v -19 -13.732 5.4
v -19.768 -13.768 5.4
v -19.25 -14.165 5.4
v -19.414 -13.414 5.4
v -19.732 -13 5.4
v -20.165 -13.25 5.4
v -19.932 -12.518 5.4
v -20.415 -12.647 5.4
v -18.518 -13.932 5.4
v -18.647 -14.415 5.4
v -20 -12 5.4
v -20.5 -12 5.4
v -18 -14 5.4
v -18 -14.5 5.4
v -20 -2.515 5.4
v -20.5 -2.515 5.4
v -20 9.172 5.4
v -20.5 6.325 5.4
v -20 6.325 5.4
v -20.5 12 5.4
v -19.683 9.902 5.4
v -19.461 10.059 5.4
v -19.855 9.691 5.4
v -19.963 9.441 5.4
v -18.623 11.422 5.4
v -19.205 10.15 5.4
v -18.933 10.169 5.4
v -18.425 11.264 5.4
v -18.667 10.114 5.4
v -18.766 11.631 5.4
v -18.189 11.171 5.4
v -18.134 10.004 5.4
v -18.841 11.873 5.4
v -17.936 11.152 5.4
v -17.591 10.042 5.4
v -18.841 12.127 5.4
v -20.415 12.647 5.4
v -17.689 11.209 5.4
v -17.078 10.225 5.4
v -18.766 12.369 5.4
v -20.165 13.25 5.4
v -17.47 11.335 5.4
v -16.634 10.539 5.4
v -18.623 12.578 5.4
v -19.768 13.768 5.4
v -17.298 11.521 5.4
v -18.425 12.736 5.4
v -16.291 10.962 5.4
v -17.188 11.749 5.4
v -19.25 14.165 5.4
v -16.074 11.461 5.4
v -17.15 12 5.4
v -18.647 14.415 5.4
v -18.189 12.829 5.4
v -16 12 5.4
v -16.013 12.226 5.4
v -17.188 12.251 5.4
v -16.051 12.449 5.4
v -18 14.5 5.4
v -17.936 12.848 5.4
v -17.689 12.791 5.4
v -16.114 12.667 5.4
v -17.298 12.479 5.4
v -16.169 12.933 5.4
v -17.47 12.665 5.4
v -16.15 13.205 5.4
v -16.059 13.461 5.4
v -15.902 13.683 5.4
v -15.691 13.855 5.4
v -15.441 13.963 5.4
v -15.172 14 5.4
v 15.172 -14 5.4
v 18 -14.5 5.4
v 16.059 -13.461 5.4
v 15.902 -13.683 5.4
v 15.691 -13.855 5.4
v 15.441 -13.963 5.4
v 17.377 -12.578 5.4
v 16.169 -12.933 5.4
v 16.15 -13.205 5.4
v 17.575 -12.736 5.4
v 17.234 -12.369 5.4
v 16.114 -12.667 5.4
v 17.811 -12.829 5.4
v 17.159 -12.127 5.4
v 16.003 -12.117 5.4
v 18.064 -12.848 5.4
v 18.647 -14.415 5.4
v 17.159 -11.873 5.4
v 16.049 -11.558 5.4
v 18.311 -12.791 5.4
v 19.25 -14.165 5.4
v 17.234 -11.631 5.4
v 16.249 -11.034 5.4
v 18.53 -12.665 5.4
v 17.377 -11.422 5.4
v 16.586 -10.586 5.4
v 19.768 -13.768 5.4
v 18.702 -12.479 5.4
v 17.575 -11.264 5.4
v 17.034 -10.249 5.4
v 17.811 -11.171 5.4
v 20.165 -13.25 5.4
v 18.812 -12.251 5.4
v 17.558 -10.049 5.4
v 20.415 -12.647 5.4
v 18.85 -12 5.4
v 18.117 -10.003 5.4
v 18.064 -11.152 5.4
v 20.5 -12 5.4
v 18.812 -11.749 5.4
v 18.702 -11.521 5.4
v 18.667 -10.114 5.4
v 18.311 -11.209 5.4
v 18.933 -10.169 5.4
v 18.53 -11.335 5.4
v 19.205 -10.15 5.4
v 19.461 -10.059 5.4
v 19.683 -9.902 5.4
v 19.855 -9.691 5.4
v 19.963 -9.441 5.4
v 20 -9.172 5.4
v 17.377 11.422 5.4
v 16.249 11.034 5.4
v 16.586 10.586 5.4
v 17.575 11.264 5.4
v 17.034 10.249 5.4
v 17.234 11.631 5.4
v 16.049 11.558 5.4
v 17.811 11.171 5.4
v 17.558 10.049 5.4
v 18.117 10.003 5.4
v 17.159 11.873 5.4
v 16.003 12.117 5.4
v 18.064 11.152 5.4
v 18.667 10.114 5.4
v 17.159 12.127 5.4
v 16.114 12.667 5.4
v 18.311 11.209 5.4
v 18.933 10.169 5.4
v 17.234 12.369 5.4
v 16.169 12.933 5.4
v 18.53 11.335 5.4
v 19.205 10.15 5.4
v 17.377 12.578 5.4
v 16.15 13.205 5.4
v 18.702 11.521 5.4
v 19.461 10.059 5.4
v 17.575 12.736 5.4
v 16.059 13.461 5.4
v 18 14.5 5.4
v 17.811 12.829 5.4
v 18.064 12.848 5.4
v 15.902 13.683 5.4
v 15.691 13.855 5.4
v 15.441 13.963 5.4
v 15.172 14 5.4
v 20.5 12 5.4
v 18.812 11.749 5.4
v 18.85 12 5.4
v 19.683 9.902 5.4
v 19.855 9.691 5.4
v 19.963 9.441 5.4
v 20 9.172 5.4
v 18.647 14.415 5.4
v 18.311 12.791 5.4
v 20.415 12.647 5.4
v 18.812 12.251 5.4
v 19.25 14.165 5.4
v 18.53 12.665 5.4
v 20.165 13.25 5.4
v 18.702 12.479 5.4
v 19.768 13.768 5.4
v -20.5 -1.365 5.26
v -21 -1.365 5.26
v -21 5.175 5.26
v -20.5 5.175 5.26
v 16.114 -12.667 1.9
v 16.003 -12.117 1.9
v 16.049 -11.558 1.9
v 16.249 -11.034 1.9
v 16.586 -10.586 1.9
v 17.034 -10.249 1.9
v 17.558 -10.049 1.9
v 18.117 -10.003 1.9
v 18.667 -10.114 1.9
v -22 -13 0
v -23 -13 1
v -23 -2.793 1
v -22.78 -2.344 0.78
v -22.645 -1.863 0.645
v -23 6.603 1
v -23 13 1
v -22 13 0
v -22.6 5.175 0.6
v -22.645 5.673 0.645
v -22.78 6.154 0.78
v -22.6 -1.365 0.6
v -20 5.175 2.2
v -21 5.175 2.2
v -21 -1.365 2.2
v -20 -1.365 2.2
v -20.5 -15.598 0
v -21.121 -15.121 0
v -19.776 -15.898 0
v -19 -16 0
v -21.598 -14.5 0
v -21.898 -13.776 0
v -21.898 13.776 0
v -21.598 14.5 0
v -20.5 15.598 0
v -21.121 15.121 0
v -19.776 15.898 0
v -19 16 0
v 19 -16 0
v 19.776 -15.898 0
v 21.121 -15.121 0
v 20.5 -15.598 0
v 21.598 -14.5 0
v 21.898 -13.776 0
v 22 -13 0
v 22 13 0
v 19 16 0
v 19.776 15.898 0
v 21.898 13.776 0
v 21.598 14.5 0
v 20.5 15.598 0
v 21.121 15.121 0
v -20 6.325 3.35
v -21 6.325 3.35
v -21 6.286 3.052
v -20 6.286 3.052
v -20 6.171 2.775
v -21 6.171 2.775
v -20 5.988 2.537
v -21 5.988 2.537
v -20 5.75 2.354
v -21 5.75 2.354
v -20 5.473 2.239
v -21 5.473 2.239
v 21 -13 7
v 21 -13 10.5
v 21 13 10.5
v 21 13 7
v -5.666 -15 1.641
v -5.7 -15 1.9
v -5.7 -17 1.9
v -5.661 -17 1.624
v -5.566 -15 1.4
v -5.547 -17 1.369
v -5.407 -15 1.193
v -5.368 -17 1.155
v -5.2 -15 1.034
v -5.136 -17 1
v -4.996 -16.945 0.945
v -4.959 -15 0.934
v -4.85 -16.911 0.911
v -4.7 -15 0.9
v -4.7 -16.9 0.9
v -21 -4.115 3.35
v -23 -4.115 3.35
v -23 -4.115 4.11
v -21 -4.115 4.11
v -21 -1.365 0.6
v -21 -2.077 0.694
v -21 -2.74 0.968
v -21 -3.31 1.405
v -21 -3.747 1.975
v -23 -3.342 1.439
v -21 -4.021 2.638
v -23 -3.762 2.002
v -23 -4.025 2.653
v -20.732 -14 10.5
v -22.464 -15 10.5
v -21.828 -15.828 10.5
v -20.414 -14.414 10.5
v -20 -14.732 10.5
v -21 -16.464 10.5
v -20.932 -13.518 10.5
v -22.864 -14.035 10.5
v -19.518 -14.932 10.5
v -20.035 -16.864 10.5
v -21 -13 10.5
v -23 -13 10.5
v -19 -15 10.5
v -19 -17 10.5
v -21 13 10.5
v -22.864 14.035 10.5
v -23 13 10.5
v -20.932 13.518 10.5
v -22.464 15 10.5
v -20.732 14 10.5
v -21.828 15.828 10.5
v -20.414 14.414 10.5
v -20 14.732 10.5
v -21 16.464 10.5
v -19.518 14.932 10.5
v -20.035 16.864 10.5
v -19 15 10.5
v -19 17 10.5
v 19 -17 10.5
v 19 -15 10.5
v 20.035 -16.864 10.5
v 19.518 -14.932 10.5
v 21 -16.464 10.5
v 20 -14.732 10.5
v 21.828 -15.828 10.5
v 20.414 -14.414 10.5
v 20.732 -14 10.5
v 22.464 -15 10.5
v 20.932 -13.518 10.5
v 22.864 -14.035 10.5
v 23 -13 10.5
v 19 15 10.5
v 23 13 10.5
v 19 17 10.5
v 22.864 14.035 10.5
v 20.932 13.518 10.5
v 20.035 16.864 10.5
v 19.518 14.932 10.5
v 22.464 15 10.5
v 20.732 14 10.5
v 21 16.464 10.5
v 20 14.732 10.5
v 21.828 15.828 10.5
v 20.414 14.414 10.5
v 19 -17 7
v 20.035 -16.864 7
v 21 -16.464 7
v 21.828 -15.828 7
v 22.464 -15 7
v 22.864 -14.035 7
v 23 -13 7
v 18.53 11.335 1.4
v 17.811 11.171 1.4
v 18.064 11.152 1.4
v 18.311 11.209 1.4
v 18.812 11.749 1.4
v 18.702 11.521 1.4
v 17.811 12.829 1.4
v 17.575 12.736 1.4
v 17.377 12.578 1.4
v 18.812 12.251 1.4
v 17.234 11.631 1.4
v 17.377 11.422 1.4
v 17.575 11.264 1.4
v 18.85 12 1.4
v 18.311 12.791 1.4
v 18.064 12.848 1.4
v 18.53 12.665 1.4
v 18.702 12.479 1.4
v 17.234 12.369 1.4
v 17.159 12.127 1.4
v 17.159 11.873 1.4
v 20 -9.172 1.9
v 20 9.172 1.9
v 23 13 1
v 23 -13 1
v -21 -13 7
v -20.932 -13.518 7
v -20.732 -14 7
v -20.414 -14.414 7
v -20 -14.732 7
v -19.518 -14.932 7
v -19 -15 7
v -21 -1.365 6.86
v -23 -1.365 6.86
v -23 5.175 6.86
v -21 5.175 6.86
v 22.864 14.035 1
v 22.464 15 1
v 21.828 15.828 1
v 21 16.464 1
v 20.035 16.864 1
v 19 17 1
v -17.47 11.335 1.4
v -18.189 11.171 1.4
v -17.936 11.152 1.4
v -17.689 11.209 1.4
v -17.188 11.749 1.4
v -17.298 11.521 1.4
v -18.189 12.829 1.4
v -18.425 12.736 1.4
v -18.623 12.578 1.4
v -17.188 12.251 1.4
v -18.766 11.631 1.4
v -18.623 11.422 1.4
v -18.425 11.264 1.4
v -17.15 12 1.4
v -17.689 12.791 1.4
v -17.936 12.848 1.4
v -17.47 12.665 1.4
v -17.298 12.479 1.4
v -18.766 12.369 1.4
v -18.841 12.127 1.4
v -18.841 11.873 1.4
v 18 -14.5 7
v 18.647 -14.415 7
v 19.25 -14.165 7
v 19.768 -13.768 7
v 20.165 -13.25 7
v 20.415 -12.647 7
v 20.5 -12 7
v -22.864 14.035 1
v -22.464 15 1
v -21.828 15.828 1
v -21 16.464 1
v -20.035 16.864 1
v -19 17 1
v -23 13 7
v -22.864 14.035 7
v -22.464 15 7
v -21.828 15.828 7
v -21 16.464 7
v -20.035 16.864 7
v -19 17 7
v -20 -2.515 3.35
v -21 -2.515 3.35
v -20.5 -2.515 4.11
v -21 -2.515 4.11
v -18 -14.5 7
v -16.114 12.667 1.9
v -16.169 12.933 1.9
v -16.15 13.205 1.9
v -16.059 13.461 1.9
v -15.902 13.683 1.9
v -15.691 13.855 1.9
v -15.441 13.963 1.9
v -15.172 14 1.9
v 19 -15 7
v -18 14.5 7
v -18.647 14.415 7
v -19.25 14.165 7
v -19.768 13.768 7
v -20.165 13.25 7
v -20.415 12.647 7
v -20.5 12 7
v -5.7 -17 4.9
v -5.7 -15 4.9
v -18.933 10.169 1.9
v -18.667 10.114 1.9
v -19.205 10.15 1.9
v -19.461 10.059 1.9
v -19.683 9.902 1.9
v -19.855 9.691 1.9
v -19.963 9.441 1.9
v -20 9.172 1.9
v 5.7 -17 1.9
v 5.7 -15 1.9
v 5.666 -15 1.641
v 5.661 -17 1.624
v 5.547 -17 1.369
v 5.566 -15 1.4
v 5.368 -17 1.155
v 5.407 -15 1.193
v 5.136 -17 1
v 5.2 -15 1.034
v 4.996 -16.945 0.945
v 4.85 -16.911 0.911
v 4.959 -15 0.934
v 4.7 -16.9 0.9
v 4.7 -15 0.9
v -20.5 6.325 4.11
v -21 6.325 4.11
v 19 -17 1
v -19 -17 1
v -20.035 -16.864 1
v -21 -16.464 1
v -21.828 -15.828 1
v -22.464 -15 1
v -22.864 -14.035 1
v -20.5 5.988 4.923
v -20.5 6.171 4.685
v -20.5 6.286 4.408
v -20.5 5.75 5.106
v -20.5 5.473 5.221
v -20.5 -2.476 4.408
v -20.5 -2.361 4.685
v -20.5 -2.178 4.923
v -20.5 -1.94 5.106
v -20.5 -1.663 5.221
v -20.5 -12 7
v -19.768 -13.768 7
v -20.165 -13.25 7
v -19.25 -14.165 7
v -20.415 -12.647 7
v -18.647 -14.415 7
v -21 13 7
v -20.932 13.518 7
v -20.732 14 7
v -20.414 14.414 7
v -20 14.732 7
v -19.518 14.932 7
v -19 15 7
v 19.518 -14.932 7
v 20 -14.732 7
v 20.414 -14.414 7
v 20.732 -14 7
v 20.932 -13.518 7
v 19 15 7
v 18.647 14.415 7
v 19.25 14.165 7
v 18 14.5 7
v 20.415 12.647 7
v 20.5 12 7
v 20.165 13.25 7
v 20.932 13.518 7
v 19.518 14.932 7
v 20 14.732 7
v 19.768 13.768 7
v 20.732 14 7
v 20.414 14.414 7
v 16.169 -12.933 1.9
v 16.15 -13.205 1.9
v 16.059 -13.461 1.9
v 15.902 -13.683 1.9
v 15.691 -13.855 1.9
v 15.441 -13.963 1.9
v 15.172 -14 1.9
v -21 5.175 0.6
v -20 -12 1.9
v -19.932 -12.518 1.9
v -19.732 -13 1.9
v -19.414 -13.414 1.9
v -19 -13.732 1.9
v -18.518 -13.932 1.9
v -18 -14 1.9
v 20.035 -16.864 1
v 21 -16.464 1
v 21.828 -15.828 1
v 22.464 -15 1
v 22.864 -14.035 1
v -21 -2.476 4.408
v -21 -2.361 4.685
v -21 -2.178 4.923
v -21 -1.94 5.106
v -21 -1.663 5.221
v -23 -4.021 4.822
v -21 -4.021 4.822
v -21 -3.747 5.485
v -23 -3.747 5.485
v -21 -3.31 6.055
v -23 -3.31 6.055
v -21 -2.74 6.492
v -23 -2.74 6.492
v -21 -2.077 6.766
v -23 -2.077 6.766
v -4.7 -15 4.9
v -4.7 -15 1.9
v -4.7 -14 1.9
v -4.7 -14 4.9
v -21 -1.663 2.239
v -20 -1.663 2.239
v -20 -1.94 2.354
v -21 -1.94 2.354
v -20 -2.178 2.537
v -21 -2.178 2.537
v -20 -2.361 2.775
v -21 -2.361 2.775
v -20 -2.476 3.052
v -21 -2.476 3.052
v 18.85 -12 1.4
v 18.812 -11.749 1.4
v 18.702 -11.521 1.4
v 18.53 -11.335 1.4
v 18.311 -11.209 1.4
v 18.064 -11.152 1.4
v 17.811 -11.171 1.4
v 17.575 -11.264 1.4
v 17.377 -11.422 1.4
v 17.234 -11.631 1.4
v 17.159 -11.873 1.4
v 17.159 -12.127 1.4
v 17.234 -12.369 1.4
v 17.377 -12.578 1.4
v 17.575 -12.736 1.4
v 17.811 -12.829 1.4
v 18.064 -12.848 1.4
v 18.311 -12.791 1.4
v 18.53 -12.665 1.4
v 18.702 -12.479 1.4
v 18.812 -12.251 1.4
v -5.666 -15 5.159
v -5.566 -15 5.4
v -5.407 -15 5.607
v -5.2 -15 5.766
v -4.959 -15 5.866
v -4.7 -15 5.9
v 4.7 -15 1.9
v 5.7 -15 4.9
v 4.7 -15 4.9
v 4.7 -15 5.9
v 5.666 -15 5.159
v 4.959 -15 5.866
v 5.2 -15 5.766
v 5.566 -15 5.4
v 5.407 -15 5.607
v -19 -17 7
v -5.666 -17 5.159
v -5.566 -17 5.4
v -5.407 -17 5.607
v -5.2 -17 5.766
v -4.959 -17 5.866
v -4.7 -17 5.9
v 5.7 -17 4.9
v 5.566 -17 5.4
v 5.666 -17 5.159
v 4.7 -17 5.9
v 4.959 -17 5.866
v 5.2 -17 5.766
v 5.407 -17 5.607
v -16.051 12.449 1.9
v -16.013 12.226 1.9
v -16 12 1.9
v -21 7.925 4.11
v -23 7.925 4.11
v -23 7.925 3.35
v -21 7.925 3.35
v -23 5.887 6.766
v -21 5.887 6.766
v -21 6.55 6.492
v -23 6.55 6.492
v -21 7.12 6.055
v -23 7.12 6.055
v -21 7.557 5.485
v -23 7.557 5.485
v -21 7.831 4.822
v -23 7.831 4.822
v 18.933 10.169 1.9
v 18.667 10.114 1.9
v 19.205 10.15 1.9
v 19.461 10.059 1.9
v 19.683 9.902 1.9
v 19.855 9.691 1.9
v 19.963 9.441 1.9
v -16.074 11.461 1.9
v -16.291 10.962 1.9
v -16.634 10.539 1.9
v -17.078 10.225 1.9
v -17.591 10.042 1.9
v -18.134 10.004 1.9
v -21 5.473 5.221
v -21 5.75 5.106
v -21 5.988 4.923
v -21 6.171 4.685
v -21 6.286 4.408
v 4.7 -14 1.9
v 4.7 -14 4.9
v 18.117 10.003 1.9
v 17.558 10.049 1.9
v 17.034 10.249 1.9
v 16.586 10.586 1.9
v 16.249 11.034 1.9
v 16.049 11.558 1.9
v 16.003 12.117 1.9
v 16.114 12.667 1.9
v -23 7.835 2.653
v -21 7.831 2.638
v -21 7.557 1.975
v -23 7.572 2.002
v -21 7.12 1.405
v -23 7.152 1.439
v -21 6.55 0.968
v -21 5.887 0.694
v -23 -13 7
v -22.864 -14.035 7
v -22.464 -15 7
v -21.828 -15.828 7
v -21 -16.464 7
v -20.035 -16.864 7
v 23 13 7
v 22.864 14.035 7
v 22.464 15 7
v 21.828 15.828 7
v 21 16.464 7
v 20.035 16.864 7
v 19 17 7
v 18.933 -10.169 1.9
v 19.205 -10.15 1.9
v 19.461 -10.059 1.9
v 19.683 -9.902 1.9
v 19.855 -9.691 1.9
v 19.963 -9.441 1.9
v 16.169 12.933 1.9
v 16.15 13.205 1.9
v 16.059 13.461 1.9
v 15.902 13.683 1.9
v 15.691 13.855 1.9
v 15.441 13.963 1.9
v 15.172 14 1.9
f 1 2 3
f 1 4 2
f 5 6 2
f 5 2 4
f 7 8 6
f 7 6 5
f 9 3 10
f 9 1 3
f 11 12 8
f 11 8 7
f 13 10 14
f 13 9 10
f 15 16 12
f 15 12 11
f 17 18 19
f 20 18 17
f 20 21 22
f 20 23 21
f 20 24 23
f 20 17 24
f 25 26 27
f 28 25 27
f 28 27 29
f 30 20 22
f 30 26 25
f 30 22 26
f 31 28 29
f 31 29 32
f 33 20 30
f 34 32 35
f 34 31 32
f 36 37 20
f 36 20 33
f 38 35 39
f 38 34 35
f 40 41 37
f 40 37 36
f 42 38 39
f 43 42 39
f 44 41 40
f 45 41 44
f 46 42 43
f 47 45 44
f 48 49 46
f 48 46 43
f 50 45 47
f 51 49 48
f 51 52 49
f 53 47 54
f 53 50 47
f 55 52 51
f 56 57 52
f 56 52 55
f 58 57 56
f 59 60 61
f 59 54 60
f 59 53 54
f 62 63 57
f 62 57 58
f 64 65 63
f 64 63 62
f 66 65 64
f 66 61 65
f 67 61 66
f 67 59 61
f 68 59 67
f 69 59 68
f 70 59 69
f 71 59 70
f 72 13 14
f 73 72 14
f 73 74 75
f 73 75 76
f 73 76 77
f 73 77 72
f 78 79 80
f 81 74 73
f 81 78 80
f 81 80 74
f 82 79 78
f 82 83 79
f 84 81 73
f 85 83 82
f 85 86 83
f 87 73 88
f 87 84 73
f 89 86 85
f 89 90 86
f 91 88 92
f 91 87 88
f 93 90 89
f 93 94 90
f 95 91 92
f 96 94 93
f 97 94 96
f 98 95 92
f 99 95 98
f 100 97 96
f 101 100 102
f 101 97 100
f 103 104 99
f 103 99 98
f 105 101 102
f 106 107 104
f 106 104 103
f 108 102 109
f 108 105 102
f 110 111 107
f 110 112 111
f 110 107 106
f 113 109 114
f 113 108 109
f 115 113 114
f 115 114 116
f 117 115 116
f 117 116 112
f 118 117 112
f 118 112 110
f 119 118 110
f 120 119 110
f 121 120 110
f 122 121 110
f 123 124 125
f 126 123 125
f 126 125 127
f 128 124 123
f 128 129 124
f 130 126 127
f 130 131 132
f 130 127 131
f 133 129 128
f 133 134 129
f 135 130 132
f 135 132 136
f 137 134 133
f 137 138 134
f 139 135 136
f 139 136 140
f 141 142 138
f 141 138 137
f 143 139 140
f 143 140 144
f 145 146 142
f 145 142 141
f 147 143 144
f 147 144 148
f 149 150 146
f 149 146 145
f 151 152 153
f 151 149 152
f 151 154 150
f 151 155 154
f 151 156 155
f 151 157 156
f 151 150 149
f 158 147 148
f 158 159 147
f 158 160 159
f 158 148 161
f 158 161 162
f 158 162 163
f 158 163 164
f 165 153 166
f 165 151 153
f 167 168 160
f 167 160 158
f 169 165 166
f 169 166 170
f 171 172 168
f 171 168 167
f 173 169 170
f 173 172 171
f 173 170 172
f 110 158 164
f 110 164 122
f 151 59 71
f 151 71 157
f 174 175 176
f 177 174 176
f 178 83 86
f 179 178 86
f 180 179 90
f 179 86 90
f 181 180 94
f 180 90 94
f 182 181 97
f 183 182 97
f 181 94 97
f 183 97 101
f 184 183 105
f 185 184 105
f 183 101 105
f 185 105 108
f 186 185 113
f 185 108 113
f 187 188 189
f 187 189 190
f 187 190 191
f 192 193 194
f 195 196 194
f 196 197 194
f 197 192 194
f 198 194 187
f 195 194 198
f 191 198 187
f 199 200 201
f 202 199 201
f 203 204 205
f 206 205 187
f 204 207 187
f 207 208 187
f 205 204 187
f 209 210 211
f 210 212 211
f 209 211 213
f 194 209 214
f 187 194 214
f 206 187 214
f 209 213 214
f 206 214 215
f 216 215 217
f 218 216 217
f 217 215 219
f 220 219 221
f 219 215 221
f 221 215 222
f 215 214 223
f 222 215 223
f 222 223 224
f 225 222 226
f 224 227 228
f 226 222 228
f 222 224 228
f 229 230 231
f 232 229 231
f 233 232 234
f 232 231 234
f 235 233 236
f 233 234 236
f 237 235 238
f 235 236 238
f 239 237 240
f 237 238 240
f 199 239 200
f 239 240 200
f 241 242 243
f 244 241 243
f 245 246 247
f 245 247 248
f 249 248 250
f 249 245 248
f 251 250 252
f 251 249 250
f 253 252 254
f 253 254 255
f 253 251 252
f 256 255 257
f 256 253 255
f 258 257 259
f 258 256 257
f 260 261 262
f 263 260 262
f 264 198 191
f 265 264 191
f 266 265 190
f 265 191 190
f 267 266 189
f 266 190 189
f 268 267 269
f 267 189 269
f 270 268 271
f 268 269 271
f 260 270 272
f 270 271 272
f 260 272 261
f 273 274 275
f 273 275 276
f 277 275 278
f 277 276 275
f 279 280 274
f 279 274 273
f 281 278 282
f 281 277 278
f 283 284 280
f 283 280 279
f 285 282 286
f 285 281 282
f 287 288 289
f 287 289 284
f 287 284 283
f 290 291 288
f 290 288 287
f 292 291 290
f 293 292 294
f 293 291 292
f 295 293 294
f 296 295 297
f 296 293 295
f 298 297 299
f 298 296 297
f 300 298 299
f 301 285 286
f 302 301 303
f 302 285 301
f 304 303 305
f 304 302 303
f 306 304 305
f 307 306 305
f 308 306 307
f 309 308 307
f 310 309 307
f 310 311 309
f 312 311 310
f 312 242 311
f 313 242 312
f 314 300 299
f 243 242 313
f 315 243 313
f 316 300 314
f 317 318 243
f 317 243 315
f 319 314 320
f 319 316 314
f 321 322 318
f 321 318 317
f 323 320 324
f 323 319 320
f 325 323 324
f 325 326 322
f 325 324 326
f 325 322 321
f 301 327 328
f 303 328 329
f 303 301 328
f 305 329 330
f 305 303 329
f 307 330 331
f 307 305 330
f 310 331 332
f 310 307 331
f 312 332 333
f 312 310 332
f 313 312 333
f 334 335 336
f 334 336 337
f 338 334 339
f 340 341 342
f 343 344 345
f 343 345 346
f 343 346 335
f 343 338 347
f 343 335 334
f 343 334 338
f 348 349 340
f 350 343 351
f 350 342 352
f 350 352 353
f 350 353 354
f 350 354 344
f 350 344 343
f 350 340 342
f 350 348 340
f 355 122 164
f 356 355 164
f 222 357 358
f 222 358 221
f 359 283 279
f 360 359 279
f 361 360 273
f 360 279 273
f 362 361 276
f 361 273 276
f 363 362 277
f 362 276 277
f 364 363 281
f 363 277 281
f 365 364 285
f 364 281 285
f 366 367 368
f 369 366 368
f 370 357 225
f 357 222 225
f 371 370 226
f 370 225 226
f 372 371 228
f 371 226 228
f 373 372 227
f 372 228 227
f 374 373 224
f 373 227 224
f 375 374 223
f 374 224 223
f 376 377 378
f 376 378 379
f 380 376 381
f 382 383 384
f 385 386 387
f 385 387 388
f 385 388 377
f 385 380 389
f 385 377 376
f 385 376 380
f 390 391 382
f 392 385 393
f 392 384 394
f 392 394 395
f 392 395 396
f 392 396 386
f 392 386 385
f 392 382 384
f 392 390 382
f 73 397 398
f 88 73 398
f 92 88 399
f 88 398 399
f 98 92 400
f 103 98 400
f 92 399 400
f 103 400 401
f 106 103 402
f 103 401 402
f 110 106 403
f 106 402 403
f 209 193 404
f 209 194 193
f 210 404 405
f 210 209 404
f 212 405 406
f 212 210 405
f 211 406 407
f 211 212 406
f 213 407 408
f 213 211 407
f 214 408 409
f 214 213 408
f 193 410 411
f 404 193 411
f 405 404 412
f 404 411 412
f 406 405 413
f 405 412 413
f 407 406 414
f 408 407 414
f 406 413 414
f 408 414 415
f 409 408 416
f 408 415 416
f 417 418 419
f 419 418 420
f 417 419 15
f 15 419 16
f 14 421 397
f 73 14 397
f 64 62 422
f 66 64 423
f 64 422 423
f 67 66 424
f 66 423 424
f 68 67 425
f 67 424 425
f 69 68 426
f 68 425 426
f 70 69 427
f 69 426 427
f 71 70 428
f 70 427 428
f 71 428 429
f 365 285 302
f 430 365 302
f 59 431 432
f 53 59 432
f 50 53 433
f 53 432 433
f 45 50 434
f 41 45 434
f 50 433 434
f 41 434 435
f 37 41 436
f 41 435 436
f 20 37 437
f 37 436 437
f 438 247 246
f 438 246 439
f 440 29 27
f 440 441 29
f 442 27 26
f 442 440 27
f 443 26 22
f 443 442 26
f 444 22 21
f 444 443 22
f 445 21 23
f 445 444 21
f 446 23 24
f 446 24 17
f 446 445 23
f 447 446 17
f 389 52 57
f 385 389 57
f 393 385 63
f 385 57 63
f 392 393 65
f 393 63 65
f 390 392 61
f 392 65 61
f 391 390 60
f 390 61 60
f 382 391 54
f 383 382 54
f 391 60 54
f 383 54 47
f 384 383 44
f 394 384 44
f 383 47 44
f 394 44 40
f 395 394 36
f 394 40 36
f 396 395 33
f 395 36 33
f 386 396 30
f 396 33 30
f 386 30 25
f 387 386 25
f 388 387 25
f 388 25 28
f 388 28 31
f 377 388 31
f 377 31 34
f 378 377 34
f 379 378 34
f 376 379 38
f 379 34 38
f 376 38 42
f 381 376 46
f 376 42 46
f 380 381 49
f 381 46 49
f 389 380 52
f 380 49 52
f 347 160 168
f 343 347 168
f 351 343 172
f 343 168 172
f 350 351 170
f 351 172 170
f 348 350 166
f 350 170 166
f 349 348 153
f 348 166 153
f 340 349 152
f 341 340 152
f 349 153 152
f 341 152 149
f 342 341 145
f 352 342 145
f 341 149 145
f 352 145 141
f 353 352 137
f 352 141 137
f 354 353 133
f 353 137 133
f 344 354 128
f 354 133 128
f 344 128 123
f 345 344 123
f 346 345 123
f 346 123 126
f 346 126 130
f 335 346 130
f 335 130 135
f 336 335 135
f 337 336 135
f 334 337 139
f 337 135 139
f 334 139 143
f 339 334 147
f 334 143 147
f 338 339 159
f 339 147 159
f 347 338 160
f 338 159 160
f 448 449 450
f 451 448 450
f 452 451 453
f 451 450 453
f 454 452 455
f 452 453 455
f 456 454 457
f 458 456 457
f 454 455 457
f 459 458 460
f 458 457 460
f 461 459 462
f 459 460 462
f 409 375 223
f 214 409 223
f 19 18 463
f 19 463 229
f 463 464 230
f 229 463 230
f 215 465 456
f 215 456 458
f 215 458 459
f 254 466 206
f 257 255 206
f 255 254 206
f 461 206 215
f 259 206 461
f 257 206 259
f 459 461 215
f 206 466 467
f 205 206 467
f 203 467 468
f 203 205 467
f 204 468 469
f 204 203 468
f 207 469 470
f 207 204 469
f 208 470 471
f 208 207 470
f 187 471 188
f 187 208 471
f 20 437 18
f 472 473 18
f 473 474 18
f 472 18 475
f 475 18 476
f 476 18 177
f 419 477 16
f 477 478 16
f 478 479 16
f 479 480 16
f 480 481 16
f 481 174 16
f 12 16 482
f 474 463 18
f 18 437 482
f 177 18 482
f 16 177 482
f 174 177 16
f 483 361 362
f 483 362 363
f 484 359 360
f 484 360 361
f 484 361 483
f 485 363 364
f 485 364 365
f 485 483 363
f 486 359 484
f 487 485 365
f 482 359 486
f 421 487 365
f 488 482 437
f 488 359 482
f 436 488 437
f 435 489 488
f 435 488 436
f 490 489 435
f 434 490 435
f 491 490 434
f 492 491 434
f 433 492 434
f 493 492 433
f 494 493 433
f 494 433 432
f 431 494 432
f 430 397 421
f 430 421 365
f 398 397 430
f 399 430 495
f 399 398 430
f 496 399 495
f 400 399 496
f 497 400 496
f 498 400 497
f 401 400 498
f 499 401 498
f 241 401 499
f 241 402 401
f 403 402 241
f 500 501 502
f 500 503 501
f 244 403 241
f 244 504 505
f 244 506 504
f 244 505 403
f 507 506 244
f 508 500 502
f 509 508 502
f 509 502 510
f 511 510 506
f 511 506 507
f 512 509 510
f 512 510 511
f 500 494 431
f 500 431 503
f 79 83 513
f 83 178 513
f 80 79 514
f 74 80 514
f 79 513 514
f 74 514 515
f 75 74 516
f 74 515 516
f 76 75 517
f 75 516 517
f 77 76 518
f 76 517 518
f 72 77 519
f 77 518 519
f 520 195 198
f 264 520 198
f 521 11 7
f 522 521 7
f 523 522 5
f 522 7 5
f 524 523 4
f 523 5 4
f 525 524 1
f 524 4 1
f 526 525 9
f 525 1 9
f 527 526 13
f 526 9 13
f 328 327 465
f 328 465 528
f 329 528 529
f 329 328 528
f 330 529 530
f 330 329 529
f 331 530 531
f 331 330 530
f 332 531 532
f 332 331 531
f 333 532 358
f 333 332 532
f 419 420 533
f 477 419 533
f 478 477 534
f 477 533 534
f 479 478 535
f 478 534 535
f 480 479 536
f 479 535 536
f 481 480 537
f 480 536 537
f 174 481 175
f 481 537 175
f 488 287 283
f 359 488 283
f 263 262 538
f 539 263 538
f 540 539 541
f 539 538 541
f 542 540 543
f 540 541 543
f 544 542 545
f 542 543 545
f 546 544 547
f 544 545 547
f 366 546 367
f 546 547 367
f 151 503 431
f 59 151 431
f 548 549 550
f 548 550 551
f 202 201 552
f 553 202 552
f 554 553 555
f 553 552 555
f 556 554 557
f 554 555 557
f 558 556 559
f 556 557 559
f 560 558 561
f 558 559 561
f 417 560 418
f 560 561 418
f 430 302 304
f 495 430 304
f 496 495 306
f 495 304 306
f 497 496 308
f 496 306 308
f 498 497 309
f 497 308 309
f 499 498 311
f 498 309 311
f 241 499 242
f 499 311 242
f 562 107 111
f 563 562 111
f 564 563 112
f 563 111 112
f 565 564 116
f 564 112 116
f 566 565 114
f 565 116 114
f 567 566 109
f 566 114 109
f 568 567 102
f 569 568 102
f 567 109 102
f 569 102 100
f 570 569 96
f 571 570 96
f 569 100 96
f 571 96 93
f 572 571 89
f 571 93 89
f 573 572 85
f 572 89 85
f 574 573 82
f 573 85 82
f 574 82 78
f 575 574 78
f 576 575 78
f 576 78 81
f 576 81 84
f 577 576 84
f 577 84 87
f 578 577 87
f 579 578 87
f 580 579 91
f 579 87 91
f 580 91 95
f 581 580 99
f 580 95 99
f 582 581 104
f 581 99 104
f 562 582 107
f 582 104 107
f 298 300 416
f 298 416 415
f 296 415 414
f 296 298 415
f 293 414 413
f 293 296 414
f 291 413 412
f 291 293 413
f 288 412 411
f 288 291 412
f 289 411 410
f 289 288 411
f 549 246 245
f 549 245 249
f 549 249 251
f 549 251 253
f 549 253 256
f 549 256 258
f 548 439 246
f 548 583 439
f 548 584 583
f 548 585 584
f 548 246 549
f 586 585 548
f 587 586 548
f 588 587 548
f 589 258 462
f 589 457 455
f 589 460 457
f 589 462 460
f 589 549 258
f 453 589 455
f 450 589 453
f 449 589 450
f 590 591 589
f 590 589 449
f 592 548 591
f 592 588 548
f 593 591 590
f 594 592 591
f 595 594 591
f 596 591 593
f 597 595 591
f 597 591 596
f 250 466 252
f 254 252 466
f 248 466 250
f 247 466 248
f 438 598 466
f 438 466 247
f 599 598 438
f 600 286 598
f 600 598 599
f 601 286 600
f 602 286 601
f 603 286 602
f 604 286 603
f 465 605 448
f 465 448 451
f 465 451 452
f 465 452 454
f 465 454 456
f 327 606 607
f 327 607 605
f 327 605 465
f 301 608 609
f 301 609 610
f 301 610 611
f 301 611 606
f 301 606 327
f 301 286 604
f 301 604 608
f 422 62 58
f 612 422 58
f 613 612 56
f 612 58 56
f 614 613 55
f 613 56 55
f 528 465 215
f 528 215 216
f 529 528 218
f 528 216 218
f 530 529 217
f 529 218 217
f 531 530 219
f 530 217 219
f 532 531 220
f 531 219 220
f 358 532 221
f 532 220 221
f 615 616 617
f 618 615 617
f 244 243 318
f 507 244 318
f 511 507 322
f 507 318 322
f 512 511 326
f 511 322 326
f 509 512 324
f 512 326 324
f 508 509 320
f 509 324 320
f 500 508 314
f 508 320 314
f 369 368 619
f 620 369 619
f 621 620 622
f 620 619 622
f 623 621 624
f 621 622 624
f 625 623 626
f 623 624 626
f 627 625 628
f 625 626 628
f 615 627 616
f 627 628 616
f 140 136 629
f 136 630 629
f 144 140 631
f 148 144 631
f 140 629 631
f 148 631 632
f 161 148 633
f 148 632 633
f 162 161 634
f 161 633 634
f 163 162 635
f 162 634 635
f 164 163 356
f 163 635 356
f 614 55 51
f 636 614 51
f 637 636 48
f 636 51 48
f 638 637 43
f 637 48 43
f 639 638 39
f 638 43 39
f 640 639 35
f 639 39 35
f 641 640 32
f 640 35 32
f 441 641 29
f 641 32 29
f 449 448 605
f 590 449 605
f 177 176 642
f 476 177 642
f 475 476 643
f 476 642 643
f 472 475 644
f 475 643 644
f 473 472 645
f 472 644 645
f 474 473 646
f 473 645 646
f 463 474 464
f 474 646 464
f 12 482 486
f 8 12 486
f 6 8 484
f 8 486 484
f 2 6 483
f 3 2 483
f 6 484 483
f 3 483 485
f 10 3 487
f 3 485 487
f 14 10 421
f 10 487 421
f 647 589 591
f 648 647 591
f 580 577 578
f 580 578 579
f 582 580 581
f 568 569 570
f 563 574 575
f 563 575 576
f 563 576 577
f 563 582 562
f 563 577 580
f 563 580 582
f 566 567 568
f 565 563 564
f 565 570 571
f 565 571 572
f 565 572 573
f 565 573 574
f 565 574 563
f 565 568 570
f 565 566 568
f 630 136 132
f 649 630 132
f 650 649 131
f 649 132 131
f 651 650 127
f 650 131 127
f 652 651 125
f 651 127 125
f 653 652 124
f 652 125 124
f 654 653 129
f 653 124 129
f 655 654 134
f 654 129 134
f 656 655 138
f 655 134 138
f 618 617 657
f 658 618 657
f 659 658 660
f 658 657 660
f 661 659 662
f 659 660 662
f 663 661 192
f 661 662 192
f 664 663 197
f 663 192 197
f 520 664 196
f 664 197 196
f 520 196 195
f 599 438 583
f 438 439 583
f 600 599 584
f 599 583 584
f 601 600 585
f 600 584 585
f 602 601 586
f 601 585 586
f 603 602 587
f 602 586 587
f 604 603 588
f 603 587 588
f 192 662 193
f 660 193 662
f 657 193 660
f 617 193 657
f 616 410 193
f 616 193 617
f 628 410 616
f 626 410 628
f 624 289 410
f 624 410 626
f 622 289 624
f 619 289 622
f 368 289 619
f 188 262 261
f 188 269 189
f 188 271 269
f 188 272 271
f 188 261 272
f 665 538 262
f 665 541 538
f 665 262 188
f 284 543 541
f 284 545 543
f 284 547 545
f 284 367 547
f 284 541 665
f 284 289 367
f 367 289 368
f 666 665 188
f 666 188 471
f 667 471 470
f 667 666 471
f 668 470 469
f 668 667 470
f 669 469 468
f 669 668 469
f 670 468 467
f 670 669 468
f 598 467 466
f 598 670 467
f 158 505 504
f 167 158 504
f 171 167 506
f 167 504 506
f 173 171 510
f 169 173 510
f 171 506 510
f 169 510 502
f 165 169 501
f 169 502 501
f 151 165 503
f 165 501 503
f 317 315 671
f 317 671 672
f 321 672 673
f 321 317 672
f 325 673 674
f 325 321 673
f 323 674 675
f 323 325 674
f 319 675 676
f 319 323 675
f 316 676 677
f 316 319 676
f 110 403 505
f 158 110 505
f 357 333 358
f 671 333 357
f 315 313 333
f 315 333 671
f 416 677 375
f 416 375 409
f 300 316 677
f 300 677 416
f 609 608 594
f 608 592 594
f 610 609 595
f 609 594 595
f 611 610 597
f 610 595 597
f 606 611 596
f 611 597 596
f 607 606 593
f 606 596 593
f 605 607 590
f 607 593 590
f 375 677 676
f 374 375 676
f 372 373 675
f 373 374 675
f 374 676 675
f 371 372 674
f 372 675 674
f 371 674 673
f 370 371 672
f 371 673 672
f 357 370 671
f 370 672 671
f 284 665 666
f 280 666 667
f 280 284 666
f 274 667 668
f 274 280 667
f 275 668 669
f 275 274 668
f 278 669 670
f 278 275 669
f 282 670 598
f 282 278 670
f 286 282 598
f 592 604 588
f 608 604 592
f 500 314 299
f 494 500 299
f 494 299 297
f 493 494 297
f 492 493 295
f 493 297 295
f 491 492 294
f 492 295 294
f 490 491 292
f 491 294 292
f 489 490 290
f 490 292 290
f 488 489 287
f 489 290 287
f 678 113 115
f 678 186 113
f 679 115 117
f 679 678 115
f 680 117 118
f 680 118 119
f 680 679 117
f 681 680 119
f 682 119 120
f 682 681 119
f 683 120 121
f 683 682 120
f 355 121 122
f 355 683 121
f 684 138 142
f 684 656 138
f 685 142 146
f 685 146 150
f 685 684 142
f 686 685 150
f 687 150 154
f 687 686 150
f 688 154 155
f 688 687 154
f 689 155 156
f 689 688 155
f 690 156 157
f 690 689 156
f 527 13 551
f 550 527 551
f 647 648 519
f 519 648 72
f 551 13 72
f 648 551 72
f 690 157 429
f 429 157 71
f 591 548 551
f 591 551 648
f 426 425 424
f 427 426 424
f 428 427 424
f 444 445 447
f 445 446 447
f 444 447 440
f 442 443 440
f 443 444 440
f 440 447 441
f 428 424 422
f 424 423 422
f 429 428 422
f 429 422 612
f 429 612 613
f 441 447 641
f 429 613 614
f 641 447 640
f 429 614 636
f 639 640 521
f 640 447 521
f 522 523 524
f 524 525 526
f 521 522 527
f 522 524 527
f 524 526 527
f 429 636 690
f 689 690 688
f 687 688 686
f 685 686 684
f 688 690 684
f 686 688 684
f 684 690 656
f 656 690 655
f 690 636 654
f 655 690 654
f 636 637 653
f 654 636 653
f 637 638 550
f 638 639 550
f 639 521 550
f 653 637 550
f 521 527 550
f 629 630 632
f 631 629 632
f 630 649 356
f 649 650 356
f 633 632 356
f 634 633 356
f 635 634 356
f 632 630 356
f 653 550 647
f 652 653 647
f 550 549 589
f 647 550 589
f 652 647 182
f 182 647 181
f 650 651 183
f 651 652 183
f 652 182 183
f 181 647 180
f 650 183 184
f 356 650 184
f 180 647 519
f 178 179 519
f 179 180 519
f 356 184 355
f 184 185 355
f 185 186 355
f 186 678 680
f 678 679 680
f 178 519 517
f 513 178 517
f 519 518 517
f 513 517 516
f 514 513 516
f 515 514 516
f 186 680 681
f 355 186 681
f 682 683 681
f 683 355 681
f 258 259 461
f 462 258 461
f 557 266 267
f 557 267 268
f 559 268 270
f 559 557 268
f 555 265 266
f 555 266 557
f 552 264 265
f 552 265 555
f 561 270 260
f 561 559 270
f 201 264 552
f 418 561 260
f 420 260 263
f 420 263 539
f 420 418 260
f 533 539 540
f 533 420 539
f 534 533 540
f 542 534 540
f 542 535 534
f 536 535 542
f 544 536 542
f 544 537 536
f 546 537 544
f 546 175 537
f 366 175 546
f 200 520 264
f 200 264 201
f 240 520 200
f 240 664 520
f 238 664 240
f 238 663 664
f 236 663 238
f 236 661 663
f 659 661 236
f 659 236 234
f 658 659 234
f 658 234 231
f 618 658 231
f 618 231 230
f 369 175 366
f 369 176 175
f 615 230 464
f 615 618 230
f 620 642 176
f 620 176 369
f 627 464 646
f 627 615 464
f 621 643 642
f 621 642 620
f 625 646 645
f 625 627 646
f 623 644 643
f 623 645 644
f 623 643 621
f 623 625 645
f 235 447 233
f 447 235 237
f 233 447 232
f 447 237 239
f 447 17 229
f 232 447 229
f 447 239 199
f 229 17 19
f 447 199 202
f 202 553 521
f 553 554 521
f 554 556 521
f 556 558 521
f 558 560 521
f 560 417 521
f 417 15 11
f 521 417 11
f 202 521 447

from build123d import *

# Parameters (mm, degrees)
SKETCH_1_W           = 46
SKETCH_1_H           = 34
EXTRUDE_1_DEPTH      = 7
CUT_EXTRUDE_1_DEPTH  = 1.6
CUT_EXTRUDE_2_DEPTH  = 3.5
FILLET_1_R           = 1
FILLET_2_R           = 4
SKETCH_5_R           = 0.85
CUT_EXTRUDE_3_DEPTH  = 4
CUT_EXTRUDE_4_REACH  = 51.538
CUT_EXTRUDE_5_DEPTH  = 2
SKETCH_7_W           = 9.4
SKETCH_7_H           = 3
CUT_EXTRUDE_6_DEPTH  = 3
SKETCH_8_W           = 11.4
SKETCH_8_H           = 5
SKETCH_8_W_2         = 9.4
SKETCH_8_H_2         = 3
CUT_EXTRUDE_7_DEPTH  = 2
FILLET_3_R           = 1
EXTRUDE_START        = 3.5
EXTRUDE_2_DEPTH      = 3.5
CHAMFER_1_SIZE       = 1
CUT_EXTRUDE_9_DEPTH  = 1.6
CUT_EXTRUDE_10_REACH = 31.106
SKETCH_11_W          = 0.5
SKETCH_11_H          = 8.840000414
CUT_EXTRUDE_11_DEPTH = 2


with BuildPart() as part:
    # 草图1 → 凸台-拉伸1 (new body)
    with BuildSketch(Plane.XY):
        Rectangle(SKETCH_1_W, SKETCH_1_H)
    extrude(amount=EXTRUDE_1_DEPTH)

    # 草图3 → 切除-拉伸1 (cut)
    with BuildSketch(Plane.XY.offset(7)):
        with BuildLine():
            Line((-18, -14), (18, -14))
            ThreePointArc((18, -14), (19.414213562, -13.414213562), (20, -12))
            Line((20, -12), (20, 12))
            ThreePointArc((20, 12), (19.414213562, 13.414213562), (18, 14))
            Line((18, 14), (-18, 14))
            ThreePointArc((-18, 14), (-19.414213562, 13.414213562), (-20, 12))
            Line((-20, 12), (-20, -12))
            ThreePointArc((-20, -12), (-19.414213562, -13.414213562), (-18, -14))
        make_face()
    extrude(amount=-CUT_EXTRUDE_1_DEPTH, mode=Mode.SUBTRACT)

    # 草图4 → 切除-拉伸2 (cut)
    with BuildSketch(Plane.XY.offset(5.4)):
        with BuildLine():
            ThreePointArc((20, 12), (16.585786438, 10.585786438), (18, 14))
            Line((18, 14), (-18, 14))
            ThreePointArc((-18, 14), (-16.585786438, 13.414213562), (-16, 12))
            ThreePointArc((-16, 12), (-18, 10), (-20, 12))
            Line((-20, 12), (-20, -12))
            ThreePointArc((-20, -12), (-19.414213562, -13.414213562), (-18, -14))
            Line((-18, -14), (18, -14))
            ThreePointArc((18, -14), (16.585786438, -10.585786438), (20, -12))
            Line((20, -12), (20, 12))
        make_face()
    extrude(amount=-CUT_EXTRUDE_2_DEPTH, mode=Mode.SUBTRACT)

    # 圆角1
    fillet_1_edges = [part.edges().sort_by_distance(p)[0] for p in [
        (18, 14, 3.65),
        (20, 12, 3.65),
        (20, -12, 3.65),
        (18, -14, 3.65),
        (-20, 12, 3.65),
        (-18, 14, 3.65),
    ]]
    fillet(fillet_1_edges, radius=FILLET_1_R)

    # 圆角2
    fillet_2_edges = [part.edges().sort_by_distance(p)[0] for p in [
        (23, -17, 3.5),
        (-23, -17, 3.5),
        (-23, 17, 3.5),
        (23, 17, 3.5),
    ]]
    fillet(fillet_2_edges, radius=FILLET_2_R)

    # 草图5 → 切除-拉伸3 (cut)
    with BuildSketch(Plane.XY.offset(5.4)):
        with Locations((-18, 12)):
            Circle(SKETCH_5_R)
        with Locations((18, 12)):
            Circle(SKETCH_5_R)
        with Locations((18, -12)):
            Circle(SKETCH_5_R)
    extrude(amount=-CUT_EXTRUDE_3_DEPTH, mode=Mode.SUBTRACT)

    # 草图6 → 切除-拉伸4 (cut, up to next)
    with BuildSketch(Plane.ZY.offset(23), mode=Mode.PRIVATE) as cut_extrude_4_sk1:
        with BuildLine():
            Line((4.109999831, 6.325004017), (3.349999795, 6.325004017))
            ThreePointArc((3.349999795, 6.325004017), (2.536826958, 5.9881768), (2.199999741, 5.175003963))
            Line((2.199999741, 5.175003963), (2.199999741, -1.364996343))
            ThreePointArc((2.199999741, -1.364996343), (2.536826958, -2.17816918), (3.349999795, -2.514996397))
            Line((3.349999795, -2.514996397), (4.109999831, -2.514996397))
            ThreePointArc((4.109999831, -2.514996397), (4.923172667, -2.17816918), (5.259999885, -1.364996343))
            Line((5.259999885, -1.364996343), (5.259999885, 5.175003963))
            ThreePointArc((5.259999885, 5.175003963), (4.923172667, 5.9881768), (4.109999831, 6.325004017))
        make_face()
    cut_extrude_4_tool1 = extrude(cut_extrude_4_sk1.sketch, amount=-CUT_EXTRUDE_4_REACH, mode=Mode.PRIVATE) & part.part
    add(cut_extrude_4_tool1.solids().sort_by_distance((-23, 1.905004, 3.73))[0], mode=Mode.SUBTRACT)

    # 草图6<3> → 切除-拉伸5 (cut)
    with BuildSketch(Plane.ZY.offset(23)):
        with BuildLine():
            Line((3.349999795, -4.014996397), (4.109999831, -4.014996397))
            ThreePointArc((4.109999831, -4.014996397), (5.983832839, -3.238829352), (6.759999885, -1.364996343))
            Line((6.759999885, -1.364996343), (6.759999885, 5.175003963))
            ThreePointArc((6.759999885, 5.175003963), (5.983832839, 7.048836972), (4.109999831, 7.825004017))
            Line((4.109999831, 7.825004017), (3.349999795, 7.825004017))
            ThreePointArc((3.349999795, 7.825004017), (1.476166787, 7.048836972), (0.699999741, 5.175003963))
            Line((0.699999741, 5.175003963), (0.699999741, -1.364996343))
            ThreePointArc((0.699999741, -1.364996343), (1.476166787, -3.238829352), (3.349999795, -4.014996397))
        make_face()
        with BuildLine():
            Line((3.349999795, -2.514996397), (4.109999831, -2.514996397))
            ThreePointArc((4.109999831, -2.514996397), (4.923172667, -2.17816918), (5.259999885, -1.364996343))
            Line((5.259999885, -1.364996343), (5.259999885, 5.175003963))
            ThreePointArc((5.259999885, 5.175003963), (4.923172667, 5.9881768), (4.109999831, 6.325004017))
            Line((4.109999831, 6.325004017), (3.349999795, 6.325004017))
            ThreePointArc((3.349999795, 6.325004017), (2.536826958, 5.9881768), (2.199999741, 5.175003963))
            Line((2.199999741, 5.175003963), (2.199999741, -1.364996343))
            ThreePointArc((2.199999741, -1.364996343), (2.536826958, -2.17816918), (3.349999795, -2.514996397))
        make_face(mode=Mode.SUBTRACT)
    extrude(amount=-CUT_EXTRUDE_5_DEPTH, mode=Mode.SUBTRACT)

    # 草图7 → 切除-拉伸6 (cut)
    with BuildSketch(Plane.XZ.offset(17)):
        with Locations((0, 3.4)):
            Rectangle(SKETCH_7_W, SKETCH_7_H)
    extrude(amount=-CUT_EXTRUDE_6_DEPTH, mode=Mode.SUBTRACT)

    # 草图8 → 切除-拉伸7 (cut)
    with BuildSketch(Plane.XZ.offset(17)):
        with Locations((0, 3.4)):
            Rectangle(SKETCH_8_W, SKETCH_8_H)
        with Locations((0, 3.4)):
            Rectangle(SKETCH_8_W_2, SKETCH_8_H_2, mode=Mode.SUBTRACT)
    extrude(amount=-CUT_EXTRUDE_7_DEPTH, mode=Mode.SUBTRACT)

    # 圆角3
    fillet_3_edges = [part.edges().sort_by_distance(p)[0] for p in [
        (5.7, -16, 0.9),
        (-5.7, -16, 0.9),
        (-5.7, -16, 5.9),
        (5.7, -16, 5.9),
    ]]
    fillet(fillet_3_edges, radius=FILLET_3_R)

    # 草图9 → 凸台-拉伸2 (add)
    with BuildSketch(Plane.XY.offset(7).offset(EXTRUDE_START)):
        with BuildLine():
            Line((-19, -17), (19, -17))
            ThreePointArc((19, -17), (21.828427125, -15.828427125), (23, -13))
            Line((23, -13), (23, 13))
            ThreePointArc((23, 13), (21.828427125, 15.828427125), (19, 17))
            Line((19, 17), (-19, 17))
            ThreePointArc((-19, 17), (-21.828427125, 15.828427125), (-23, 13))
            Line((-23, 13), (-23, -13))
            ThreePointArc((-23, -13), (-21.828427125, -15.828427125), (-19, -17))
        make_face()
        with BuildLine():
            Line((-19, -15), (19, -15))
            ThreePointArc((19, -15), (20.414213562, -14.414213562), (21, -13))
            Line((21, -13), (21, 13))
            ThreePointArc((21, 13), (20.414213562, 14.414213562), (19, 15))
            Line((19, 15), (-19, 15))
            ThreePointArc((-19, 15), (-20.414213562, 14.414213562), (-21, 13))
            Line((-21, 13), (-21, -13))
            ThreePointArc((-21, -13), (-20.414213562, -14.414213562), (-19, -15))
        make_face(mode=Mode.SUBTRACT)
    extrude(amount=-EXTRUDE_2_DEPTH)

    # 倒角1
    # the kernel refuses this chamfer: 1 mm, written as the material it takes off along each edge
    with BuildSketch(Plane(origin=(19, 13, 0), x_dir=(1, 0, 0), z_dir=(0, -1, 0))) as chamfer_1_piece_1:
        Polygon((4, CHAMFER_1_SIZE), (4 - CHAMFER_1_SIZE, 0), (4, 0), align=None)
    revolve(axis=Axis((19, 13, 0), (0, 0, 1)), revolution_arc=90, mode=Mode.SUBTRACT)
    with BuildSketch(Plane(origin=(19, 17, 0), x_dir=(0, 0.02749587661058563, 0.9996219169112968), z_dir=(-1, 0, 0)), Plane(origin=(-19, -17, 0), x_dir=(0, -0.02749587661058563, 0.9996219169112968), z_dir=(1, 0, 0))) as chamfer_1_piece_2:
        Polygon((CHAMFER_1_SIZE * 0.999621916911, -CHAMFER_1_SIZE * 0.0274958766106), (-CHAMFER_1_SIZE * 0.0274958766106, -CHAMFER_1_SIZE * 0.999621916911), (0, 0), align=None)
    extrude(amount=38, mode=Mode.SUBTRACT)
    with BuildSketch(Plane(origin=(-19, 13, 0), x_dir=(-1, 0, 0), z_dir=(0, -1, 0))) as chamfer_1_piece_3:
        Polygon((4, -CHAMFER_1_SIZE), (4 - CHAMFER_1_SIZE, 0), (4, 0), align=None)
    revolve(axis=Axis((-19, 13, 0), (0, 0, -1)), revolution_arc=90, mode=Mode.SUBTRACT)
    with BuildSketch(Plane(origin=(-23, 13, 0), x_dir=(-0.02749587661058563, 0, 0.9996219169112968), z_dir=(0, -1, 0)), Plane(origin=(23, -13, 0), x_dir=(0.02749587661058563, 0, 0.9996219169112968), z_dir=(0, 1, 0))) as chamfer_1_piece_4:
        Polygon((CHAMFER_1_SIZE * 0.999621916911, -CHAMFER_1_SIZE * 0.0274958766106), (-CHAMFER_1_SIZE * 0.0274958766106, -CHAMFER_1_SIZE * 0.999621916911), (0, 0), align=None)
    extrude(amount=26, mode=Mode.SUBTRACT)
    with BuildSketch(Plane(origin=(-19, -13, 0), x_dir=(0, -1, 0), z_dir=(1, 0, 0))) as chamfer_1_piece_5:
        Polygon((4, -CHAMFER_1_SIZE), (4 - CHAMFER_1_SIZE, 0), (4, 0), align=None)
    revolve(axis=Axis((-19, -13, 0), (0, 0, -1)), revolution_arc=90, mode=Mode.SUBTRACT)
    with BuildSketch(Plane(origin=(19, -13, 0), x_dir=(0, -1, 0), z_dir=(-1, 0, 0))) as chamfer_1_piece_6:
        Polygon((4, CHAMFER_1_SIZE), (4 - CHAMFER_1_SIZE, 0), (4, 0), align=None)
    revolve(axis=Axis((19, -13, 0), (0, 0, 1)), revolution_arc=90, mode=Mode.SUBTRACT)

    # 草图10 → 切除-拉伸9 (cut)
    # profile 1 of 2: a face of its own
    with BuildSketch(Plane.XY.offset(7)):
        with BuildLine():
            Line((-18, -14.5), (18, -14.5))
            ThreePointArc((18, -14.5), (19.767766953, -13.767766953), (20.5, -12))
            Line((20.5, -12), (20.5, 12))
            ThreePointArc((20.5, 12), (19.767766953, 13.767766953), (18, 14.5))
            Line((18, 14.5), (-18, 14.5))
            ThreePointArc((-18, 14.5), (-19.767766953, 13.767766953), (-20.5, 12))
            Line((-20.5, 12), (-20.5, 9.171572875))
            Line((-20.5, 9.171572875), (-20.5, -12))
            ThreePointArc((-20.5, -12), (-19.767766953, -13.767766953), (-18, -14.5))
        make_face()
        with BuildLine():
            ThreePointArc((-20, 12), (-19.414213562, 13.414213562), (-18, 14))
            Line((-18, 14), (18, 14))
            ThreePointArc((18, 14), (19.414213562, 13.414213562), (20, 12))
            Line((20, 12), (20, -12))
            ThreePointArc((20, -12), (19.414213562, -13.414213562), (18, -14))
            Line((18, -14), (-18, -14))
            ThreePointArc((-18, -14), (-19.414213562, -13.414213562), (-20, -12))
            Line((-20, -12), (-20, 12))
        make_face(mode=Mode.SUBTRACT)
    # profile 2 of 2: a face of its own
    with BuildSketch(Plane.XY.offset(7)):
        with BuildLine():
            ThreePointArc((20, 12), (19.414213562, 13.414213562), (18, 14))
            Line((18, 14), (-18, 14))
            ThreePointArc((-18, 14), (-19.414213562, 13.414213562), (-20, 12))
            Line((-20, 12), (-20, 9.171572875))
            Line((-20, 9.171572875), (-20, -12))
            ThreePointArc((-20, -12), (-19.414213562, -13.414213562), (-18, -14))
            Line((-18, -14), (18, -14))
            ThreePointArc((18, -14), (19.414213562, -13.414213562), (20, -12))
            Line((20, -12), (20, 12))
        make_face()
    extrude(amount=-CUT_EXTRUDE_9_DEPTH, mode=Mode.SUBTRACT)

    # 草图11 → 切除-拉伸10 (cut, up to next)
    with BuildSketch(Plane.XY.offset(5.4), mode=Mode.PRIVATE) as cut_extrude_10_sk1:
        with Locations((-20.25, 1.90500381)):
            Rectangle(SKETCH_11_W, SKETCH_11_H)
    cut_extrude_10_tool1 = extrude(cut_extrude_10_sk1.sketch, amount=-CUT_EXTRUDE_10_REACH, mode=Mode.PRIVATE) & part.part
    add(cut_extrude_10_tool1.solids().sort_by_distance((-20.25, 1.905004, 5.4))[0], mode=Mode.SUBTRACT)

    # 草图12 → 切除-拉伸11 (cut)
    with BuildSketch(Plane.ZY.offset(23)):
        with BuildLine():
            Line((0.599999741, 5.175003963), (0.599999741, -1.364996343))
            ThreePointArc((0.599999741, -1.364996343), (1.405456108, -3.30954003), (3.349999795, -4.114996397))
            Line((3.349999795, -4.114996397), (4.109999831, -4.114996397))
            ThreePointArc((4.109999831, -4.114996397), (6.054543517, -3.30954003), (6.859999885, -1.364996343))
            Line((6.859999885, -1.364996343), (6.859999885, 5.175003963))
            ThreePointArc((6.859999885, 5.175003963), (6.054543517, 7.11954765), (4.109999831, 7.925004017))
            Line((4.109999831, 7.925004017), (3.349999795, 7.925004017))
            ThreePointArc((3.349999795, 7.925004017), (1.405456108, 7.11954765), (0.599999741, 5.175003963))
        make_face()
    extrude(amount=-CUT_EXTRUDE_11_DEPTH, mode=Mode.SUBTRACT)


solid = part.part
